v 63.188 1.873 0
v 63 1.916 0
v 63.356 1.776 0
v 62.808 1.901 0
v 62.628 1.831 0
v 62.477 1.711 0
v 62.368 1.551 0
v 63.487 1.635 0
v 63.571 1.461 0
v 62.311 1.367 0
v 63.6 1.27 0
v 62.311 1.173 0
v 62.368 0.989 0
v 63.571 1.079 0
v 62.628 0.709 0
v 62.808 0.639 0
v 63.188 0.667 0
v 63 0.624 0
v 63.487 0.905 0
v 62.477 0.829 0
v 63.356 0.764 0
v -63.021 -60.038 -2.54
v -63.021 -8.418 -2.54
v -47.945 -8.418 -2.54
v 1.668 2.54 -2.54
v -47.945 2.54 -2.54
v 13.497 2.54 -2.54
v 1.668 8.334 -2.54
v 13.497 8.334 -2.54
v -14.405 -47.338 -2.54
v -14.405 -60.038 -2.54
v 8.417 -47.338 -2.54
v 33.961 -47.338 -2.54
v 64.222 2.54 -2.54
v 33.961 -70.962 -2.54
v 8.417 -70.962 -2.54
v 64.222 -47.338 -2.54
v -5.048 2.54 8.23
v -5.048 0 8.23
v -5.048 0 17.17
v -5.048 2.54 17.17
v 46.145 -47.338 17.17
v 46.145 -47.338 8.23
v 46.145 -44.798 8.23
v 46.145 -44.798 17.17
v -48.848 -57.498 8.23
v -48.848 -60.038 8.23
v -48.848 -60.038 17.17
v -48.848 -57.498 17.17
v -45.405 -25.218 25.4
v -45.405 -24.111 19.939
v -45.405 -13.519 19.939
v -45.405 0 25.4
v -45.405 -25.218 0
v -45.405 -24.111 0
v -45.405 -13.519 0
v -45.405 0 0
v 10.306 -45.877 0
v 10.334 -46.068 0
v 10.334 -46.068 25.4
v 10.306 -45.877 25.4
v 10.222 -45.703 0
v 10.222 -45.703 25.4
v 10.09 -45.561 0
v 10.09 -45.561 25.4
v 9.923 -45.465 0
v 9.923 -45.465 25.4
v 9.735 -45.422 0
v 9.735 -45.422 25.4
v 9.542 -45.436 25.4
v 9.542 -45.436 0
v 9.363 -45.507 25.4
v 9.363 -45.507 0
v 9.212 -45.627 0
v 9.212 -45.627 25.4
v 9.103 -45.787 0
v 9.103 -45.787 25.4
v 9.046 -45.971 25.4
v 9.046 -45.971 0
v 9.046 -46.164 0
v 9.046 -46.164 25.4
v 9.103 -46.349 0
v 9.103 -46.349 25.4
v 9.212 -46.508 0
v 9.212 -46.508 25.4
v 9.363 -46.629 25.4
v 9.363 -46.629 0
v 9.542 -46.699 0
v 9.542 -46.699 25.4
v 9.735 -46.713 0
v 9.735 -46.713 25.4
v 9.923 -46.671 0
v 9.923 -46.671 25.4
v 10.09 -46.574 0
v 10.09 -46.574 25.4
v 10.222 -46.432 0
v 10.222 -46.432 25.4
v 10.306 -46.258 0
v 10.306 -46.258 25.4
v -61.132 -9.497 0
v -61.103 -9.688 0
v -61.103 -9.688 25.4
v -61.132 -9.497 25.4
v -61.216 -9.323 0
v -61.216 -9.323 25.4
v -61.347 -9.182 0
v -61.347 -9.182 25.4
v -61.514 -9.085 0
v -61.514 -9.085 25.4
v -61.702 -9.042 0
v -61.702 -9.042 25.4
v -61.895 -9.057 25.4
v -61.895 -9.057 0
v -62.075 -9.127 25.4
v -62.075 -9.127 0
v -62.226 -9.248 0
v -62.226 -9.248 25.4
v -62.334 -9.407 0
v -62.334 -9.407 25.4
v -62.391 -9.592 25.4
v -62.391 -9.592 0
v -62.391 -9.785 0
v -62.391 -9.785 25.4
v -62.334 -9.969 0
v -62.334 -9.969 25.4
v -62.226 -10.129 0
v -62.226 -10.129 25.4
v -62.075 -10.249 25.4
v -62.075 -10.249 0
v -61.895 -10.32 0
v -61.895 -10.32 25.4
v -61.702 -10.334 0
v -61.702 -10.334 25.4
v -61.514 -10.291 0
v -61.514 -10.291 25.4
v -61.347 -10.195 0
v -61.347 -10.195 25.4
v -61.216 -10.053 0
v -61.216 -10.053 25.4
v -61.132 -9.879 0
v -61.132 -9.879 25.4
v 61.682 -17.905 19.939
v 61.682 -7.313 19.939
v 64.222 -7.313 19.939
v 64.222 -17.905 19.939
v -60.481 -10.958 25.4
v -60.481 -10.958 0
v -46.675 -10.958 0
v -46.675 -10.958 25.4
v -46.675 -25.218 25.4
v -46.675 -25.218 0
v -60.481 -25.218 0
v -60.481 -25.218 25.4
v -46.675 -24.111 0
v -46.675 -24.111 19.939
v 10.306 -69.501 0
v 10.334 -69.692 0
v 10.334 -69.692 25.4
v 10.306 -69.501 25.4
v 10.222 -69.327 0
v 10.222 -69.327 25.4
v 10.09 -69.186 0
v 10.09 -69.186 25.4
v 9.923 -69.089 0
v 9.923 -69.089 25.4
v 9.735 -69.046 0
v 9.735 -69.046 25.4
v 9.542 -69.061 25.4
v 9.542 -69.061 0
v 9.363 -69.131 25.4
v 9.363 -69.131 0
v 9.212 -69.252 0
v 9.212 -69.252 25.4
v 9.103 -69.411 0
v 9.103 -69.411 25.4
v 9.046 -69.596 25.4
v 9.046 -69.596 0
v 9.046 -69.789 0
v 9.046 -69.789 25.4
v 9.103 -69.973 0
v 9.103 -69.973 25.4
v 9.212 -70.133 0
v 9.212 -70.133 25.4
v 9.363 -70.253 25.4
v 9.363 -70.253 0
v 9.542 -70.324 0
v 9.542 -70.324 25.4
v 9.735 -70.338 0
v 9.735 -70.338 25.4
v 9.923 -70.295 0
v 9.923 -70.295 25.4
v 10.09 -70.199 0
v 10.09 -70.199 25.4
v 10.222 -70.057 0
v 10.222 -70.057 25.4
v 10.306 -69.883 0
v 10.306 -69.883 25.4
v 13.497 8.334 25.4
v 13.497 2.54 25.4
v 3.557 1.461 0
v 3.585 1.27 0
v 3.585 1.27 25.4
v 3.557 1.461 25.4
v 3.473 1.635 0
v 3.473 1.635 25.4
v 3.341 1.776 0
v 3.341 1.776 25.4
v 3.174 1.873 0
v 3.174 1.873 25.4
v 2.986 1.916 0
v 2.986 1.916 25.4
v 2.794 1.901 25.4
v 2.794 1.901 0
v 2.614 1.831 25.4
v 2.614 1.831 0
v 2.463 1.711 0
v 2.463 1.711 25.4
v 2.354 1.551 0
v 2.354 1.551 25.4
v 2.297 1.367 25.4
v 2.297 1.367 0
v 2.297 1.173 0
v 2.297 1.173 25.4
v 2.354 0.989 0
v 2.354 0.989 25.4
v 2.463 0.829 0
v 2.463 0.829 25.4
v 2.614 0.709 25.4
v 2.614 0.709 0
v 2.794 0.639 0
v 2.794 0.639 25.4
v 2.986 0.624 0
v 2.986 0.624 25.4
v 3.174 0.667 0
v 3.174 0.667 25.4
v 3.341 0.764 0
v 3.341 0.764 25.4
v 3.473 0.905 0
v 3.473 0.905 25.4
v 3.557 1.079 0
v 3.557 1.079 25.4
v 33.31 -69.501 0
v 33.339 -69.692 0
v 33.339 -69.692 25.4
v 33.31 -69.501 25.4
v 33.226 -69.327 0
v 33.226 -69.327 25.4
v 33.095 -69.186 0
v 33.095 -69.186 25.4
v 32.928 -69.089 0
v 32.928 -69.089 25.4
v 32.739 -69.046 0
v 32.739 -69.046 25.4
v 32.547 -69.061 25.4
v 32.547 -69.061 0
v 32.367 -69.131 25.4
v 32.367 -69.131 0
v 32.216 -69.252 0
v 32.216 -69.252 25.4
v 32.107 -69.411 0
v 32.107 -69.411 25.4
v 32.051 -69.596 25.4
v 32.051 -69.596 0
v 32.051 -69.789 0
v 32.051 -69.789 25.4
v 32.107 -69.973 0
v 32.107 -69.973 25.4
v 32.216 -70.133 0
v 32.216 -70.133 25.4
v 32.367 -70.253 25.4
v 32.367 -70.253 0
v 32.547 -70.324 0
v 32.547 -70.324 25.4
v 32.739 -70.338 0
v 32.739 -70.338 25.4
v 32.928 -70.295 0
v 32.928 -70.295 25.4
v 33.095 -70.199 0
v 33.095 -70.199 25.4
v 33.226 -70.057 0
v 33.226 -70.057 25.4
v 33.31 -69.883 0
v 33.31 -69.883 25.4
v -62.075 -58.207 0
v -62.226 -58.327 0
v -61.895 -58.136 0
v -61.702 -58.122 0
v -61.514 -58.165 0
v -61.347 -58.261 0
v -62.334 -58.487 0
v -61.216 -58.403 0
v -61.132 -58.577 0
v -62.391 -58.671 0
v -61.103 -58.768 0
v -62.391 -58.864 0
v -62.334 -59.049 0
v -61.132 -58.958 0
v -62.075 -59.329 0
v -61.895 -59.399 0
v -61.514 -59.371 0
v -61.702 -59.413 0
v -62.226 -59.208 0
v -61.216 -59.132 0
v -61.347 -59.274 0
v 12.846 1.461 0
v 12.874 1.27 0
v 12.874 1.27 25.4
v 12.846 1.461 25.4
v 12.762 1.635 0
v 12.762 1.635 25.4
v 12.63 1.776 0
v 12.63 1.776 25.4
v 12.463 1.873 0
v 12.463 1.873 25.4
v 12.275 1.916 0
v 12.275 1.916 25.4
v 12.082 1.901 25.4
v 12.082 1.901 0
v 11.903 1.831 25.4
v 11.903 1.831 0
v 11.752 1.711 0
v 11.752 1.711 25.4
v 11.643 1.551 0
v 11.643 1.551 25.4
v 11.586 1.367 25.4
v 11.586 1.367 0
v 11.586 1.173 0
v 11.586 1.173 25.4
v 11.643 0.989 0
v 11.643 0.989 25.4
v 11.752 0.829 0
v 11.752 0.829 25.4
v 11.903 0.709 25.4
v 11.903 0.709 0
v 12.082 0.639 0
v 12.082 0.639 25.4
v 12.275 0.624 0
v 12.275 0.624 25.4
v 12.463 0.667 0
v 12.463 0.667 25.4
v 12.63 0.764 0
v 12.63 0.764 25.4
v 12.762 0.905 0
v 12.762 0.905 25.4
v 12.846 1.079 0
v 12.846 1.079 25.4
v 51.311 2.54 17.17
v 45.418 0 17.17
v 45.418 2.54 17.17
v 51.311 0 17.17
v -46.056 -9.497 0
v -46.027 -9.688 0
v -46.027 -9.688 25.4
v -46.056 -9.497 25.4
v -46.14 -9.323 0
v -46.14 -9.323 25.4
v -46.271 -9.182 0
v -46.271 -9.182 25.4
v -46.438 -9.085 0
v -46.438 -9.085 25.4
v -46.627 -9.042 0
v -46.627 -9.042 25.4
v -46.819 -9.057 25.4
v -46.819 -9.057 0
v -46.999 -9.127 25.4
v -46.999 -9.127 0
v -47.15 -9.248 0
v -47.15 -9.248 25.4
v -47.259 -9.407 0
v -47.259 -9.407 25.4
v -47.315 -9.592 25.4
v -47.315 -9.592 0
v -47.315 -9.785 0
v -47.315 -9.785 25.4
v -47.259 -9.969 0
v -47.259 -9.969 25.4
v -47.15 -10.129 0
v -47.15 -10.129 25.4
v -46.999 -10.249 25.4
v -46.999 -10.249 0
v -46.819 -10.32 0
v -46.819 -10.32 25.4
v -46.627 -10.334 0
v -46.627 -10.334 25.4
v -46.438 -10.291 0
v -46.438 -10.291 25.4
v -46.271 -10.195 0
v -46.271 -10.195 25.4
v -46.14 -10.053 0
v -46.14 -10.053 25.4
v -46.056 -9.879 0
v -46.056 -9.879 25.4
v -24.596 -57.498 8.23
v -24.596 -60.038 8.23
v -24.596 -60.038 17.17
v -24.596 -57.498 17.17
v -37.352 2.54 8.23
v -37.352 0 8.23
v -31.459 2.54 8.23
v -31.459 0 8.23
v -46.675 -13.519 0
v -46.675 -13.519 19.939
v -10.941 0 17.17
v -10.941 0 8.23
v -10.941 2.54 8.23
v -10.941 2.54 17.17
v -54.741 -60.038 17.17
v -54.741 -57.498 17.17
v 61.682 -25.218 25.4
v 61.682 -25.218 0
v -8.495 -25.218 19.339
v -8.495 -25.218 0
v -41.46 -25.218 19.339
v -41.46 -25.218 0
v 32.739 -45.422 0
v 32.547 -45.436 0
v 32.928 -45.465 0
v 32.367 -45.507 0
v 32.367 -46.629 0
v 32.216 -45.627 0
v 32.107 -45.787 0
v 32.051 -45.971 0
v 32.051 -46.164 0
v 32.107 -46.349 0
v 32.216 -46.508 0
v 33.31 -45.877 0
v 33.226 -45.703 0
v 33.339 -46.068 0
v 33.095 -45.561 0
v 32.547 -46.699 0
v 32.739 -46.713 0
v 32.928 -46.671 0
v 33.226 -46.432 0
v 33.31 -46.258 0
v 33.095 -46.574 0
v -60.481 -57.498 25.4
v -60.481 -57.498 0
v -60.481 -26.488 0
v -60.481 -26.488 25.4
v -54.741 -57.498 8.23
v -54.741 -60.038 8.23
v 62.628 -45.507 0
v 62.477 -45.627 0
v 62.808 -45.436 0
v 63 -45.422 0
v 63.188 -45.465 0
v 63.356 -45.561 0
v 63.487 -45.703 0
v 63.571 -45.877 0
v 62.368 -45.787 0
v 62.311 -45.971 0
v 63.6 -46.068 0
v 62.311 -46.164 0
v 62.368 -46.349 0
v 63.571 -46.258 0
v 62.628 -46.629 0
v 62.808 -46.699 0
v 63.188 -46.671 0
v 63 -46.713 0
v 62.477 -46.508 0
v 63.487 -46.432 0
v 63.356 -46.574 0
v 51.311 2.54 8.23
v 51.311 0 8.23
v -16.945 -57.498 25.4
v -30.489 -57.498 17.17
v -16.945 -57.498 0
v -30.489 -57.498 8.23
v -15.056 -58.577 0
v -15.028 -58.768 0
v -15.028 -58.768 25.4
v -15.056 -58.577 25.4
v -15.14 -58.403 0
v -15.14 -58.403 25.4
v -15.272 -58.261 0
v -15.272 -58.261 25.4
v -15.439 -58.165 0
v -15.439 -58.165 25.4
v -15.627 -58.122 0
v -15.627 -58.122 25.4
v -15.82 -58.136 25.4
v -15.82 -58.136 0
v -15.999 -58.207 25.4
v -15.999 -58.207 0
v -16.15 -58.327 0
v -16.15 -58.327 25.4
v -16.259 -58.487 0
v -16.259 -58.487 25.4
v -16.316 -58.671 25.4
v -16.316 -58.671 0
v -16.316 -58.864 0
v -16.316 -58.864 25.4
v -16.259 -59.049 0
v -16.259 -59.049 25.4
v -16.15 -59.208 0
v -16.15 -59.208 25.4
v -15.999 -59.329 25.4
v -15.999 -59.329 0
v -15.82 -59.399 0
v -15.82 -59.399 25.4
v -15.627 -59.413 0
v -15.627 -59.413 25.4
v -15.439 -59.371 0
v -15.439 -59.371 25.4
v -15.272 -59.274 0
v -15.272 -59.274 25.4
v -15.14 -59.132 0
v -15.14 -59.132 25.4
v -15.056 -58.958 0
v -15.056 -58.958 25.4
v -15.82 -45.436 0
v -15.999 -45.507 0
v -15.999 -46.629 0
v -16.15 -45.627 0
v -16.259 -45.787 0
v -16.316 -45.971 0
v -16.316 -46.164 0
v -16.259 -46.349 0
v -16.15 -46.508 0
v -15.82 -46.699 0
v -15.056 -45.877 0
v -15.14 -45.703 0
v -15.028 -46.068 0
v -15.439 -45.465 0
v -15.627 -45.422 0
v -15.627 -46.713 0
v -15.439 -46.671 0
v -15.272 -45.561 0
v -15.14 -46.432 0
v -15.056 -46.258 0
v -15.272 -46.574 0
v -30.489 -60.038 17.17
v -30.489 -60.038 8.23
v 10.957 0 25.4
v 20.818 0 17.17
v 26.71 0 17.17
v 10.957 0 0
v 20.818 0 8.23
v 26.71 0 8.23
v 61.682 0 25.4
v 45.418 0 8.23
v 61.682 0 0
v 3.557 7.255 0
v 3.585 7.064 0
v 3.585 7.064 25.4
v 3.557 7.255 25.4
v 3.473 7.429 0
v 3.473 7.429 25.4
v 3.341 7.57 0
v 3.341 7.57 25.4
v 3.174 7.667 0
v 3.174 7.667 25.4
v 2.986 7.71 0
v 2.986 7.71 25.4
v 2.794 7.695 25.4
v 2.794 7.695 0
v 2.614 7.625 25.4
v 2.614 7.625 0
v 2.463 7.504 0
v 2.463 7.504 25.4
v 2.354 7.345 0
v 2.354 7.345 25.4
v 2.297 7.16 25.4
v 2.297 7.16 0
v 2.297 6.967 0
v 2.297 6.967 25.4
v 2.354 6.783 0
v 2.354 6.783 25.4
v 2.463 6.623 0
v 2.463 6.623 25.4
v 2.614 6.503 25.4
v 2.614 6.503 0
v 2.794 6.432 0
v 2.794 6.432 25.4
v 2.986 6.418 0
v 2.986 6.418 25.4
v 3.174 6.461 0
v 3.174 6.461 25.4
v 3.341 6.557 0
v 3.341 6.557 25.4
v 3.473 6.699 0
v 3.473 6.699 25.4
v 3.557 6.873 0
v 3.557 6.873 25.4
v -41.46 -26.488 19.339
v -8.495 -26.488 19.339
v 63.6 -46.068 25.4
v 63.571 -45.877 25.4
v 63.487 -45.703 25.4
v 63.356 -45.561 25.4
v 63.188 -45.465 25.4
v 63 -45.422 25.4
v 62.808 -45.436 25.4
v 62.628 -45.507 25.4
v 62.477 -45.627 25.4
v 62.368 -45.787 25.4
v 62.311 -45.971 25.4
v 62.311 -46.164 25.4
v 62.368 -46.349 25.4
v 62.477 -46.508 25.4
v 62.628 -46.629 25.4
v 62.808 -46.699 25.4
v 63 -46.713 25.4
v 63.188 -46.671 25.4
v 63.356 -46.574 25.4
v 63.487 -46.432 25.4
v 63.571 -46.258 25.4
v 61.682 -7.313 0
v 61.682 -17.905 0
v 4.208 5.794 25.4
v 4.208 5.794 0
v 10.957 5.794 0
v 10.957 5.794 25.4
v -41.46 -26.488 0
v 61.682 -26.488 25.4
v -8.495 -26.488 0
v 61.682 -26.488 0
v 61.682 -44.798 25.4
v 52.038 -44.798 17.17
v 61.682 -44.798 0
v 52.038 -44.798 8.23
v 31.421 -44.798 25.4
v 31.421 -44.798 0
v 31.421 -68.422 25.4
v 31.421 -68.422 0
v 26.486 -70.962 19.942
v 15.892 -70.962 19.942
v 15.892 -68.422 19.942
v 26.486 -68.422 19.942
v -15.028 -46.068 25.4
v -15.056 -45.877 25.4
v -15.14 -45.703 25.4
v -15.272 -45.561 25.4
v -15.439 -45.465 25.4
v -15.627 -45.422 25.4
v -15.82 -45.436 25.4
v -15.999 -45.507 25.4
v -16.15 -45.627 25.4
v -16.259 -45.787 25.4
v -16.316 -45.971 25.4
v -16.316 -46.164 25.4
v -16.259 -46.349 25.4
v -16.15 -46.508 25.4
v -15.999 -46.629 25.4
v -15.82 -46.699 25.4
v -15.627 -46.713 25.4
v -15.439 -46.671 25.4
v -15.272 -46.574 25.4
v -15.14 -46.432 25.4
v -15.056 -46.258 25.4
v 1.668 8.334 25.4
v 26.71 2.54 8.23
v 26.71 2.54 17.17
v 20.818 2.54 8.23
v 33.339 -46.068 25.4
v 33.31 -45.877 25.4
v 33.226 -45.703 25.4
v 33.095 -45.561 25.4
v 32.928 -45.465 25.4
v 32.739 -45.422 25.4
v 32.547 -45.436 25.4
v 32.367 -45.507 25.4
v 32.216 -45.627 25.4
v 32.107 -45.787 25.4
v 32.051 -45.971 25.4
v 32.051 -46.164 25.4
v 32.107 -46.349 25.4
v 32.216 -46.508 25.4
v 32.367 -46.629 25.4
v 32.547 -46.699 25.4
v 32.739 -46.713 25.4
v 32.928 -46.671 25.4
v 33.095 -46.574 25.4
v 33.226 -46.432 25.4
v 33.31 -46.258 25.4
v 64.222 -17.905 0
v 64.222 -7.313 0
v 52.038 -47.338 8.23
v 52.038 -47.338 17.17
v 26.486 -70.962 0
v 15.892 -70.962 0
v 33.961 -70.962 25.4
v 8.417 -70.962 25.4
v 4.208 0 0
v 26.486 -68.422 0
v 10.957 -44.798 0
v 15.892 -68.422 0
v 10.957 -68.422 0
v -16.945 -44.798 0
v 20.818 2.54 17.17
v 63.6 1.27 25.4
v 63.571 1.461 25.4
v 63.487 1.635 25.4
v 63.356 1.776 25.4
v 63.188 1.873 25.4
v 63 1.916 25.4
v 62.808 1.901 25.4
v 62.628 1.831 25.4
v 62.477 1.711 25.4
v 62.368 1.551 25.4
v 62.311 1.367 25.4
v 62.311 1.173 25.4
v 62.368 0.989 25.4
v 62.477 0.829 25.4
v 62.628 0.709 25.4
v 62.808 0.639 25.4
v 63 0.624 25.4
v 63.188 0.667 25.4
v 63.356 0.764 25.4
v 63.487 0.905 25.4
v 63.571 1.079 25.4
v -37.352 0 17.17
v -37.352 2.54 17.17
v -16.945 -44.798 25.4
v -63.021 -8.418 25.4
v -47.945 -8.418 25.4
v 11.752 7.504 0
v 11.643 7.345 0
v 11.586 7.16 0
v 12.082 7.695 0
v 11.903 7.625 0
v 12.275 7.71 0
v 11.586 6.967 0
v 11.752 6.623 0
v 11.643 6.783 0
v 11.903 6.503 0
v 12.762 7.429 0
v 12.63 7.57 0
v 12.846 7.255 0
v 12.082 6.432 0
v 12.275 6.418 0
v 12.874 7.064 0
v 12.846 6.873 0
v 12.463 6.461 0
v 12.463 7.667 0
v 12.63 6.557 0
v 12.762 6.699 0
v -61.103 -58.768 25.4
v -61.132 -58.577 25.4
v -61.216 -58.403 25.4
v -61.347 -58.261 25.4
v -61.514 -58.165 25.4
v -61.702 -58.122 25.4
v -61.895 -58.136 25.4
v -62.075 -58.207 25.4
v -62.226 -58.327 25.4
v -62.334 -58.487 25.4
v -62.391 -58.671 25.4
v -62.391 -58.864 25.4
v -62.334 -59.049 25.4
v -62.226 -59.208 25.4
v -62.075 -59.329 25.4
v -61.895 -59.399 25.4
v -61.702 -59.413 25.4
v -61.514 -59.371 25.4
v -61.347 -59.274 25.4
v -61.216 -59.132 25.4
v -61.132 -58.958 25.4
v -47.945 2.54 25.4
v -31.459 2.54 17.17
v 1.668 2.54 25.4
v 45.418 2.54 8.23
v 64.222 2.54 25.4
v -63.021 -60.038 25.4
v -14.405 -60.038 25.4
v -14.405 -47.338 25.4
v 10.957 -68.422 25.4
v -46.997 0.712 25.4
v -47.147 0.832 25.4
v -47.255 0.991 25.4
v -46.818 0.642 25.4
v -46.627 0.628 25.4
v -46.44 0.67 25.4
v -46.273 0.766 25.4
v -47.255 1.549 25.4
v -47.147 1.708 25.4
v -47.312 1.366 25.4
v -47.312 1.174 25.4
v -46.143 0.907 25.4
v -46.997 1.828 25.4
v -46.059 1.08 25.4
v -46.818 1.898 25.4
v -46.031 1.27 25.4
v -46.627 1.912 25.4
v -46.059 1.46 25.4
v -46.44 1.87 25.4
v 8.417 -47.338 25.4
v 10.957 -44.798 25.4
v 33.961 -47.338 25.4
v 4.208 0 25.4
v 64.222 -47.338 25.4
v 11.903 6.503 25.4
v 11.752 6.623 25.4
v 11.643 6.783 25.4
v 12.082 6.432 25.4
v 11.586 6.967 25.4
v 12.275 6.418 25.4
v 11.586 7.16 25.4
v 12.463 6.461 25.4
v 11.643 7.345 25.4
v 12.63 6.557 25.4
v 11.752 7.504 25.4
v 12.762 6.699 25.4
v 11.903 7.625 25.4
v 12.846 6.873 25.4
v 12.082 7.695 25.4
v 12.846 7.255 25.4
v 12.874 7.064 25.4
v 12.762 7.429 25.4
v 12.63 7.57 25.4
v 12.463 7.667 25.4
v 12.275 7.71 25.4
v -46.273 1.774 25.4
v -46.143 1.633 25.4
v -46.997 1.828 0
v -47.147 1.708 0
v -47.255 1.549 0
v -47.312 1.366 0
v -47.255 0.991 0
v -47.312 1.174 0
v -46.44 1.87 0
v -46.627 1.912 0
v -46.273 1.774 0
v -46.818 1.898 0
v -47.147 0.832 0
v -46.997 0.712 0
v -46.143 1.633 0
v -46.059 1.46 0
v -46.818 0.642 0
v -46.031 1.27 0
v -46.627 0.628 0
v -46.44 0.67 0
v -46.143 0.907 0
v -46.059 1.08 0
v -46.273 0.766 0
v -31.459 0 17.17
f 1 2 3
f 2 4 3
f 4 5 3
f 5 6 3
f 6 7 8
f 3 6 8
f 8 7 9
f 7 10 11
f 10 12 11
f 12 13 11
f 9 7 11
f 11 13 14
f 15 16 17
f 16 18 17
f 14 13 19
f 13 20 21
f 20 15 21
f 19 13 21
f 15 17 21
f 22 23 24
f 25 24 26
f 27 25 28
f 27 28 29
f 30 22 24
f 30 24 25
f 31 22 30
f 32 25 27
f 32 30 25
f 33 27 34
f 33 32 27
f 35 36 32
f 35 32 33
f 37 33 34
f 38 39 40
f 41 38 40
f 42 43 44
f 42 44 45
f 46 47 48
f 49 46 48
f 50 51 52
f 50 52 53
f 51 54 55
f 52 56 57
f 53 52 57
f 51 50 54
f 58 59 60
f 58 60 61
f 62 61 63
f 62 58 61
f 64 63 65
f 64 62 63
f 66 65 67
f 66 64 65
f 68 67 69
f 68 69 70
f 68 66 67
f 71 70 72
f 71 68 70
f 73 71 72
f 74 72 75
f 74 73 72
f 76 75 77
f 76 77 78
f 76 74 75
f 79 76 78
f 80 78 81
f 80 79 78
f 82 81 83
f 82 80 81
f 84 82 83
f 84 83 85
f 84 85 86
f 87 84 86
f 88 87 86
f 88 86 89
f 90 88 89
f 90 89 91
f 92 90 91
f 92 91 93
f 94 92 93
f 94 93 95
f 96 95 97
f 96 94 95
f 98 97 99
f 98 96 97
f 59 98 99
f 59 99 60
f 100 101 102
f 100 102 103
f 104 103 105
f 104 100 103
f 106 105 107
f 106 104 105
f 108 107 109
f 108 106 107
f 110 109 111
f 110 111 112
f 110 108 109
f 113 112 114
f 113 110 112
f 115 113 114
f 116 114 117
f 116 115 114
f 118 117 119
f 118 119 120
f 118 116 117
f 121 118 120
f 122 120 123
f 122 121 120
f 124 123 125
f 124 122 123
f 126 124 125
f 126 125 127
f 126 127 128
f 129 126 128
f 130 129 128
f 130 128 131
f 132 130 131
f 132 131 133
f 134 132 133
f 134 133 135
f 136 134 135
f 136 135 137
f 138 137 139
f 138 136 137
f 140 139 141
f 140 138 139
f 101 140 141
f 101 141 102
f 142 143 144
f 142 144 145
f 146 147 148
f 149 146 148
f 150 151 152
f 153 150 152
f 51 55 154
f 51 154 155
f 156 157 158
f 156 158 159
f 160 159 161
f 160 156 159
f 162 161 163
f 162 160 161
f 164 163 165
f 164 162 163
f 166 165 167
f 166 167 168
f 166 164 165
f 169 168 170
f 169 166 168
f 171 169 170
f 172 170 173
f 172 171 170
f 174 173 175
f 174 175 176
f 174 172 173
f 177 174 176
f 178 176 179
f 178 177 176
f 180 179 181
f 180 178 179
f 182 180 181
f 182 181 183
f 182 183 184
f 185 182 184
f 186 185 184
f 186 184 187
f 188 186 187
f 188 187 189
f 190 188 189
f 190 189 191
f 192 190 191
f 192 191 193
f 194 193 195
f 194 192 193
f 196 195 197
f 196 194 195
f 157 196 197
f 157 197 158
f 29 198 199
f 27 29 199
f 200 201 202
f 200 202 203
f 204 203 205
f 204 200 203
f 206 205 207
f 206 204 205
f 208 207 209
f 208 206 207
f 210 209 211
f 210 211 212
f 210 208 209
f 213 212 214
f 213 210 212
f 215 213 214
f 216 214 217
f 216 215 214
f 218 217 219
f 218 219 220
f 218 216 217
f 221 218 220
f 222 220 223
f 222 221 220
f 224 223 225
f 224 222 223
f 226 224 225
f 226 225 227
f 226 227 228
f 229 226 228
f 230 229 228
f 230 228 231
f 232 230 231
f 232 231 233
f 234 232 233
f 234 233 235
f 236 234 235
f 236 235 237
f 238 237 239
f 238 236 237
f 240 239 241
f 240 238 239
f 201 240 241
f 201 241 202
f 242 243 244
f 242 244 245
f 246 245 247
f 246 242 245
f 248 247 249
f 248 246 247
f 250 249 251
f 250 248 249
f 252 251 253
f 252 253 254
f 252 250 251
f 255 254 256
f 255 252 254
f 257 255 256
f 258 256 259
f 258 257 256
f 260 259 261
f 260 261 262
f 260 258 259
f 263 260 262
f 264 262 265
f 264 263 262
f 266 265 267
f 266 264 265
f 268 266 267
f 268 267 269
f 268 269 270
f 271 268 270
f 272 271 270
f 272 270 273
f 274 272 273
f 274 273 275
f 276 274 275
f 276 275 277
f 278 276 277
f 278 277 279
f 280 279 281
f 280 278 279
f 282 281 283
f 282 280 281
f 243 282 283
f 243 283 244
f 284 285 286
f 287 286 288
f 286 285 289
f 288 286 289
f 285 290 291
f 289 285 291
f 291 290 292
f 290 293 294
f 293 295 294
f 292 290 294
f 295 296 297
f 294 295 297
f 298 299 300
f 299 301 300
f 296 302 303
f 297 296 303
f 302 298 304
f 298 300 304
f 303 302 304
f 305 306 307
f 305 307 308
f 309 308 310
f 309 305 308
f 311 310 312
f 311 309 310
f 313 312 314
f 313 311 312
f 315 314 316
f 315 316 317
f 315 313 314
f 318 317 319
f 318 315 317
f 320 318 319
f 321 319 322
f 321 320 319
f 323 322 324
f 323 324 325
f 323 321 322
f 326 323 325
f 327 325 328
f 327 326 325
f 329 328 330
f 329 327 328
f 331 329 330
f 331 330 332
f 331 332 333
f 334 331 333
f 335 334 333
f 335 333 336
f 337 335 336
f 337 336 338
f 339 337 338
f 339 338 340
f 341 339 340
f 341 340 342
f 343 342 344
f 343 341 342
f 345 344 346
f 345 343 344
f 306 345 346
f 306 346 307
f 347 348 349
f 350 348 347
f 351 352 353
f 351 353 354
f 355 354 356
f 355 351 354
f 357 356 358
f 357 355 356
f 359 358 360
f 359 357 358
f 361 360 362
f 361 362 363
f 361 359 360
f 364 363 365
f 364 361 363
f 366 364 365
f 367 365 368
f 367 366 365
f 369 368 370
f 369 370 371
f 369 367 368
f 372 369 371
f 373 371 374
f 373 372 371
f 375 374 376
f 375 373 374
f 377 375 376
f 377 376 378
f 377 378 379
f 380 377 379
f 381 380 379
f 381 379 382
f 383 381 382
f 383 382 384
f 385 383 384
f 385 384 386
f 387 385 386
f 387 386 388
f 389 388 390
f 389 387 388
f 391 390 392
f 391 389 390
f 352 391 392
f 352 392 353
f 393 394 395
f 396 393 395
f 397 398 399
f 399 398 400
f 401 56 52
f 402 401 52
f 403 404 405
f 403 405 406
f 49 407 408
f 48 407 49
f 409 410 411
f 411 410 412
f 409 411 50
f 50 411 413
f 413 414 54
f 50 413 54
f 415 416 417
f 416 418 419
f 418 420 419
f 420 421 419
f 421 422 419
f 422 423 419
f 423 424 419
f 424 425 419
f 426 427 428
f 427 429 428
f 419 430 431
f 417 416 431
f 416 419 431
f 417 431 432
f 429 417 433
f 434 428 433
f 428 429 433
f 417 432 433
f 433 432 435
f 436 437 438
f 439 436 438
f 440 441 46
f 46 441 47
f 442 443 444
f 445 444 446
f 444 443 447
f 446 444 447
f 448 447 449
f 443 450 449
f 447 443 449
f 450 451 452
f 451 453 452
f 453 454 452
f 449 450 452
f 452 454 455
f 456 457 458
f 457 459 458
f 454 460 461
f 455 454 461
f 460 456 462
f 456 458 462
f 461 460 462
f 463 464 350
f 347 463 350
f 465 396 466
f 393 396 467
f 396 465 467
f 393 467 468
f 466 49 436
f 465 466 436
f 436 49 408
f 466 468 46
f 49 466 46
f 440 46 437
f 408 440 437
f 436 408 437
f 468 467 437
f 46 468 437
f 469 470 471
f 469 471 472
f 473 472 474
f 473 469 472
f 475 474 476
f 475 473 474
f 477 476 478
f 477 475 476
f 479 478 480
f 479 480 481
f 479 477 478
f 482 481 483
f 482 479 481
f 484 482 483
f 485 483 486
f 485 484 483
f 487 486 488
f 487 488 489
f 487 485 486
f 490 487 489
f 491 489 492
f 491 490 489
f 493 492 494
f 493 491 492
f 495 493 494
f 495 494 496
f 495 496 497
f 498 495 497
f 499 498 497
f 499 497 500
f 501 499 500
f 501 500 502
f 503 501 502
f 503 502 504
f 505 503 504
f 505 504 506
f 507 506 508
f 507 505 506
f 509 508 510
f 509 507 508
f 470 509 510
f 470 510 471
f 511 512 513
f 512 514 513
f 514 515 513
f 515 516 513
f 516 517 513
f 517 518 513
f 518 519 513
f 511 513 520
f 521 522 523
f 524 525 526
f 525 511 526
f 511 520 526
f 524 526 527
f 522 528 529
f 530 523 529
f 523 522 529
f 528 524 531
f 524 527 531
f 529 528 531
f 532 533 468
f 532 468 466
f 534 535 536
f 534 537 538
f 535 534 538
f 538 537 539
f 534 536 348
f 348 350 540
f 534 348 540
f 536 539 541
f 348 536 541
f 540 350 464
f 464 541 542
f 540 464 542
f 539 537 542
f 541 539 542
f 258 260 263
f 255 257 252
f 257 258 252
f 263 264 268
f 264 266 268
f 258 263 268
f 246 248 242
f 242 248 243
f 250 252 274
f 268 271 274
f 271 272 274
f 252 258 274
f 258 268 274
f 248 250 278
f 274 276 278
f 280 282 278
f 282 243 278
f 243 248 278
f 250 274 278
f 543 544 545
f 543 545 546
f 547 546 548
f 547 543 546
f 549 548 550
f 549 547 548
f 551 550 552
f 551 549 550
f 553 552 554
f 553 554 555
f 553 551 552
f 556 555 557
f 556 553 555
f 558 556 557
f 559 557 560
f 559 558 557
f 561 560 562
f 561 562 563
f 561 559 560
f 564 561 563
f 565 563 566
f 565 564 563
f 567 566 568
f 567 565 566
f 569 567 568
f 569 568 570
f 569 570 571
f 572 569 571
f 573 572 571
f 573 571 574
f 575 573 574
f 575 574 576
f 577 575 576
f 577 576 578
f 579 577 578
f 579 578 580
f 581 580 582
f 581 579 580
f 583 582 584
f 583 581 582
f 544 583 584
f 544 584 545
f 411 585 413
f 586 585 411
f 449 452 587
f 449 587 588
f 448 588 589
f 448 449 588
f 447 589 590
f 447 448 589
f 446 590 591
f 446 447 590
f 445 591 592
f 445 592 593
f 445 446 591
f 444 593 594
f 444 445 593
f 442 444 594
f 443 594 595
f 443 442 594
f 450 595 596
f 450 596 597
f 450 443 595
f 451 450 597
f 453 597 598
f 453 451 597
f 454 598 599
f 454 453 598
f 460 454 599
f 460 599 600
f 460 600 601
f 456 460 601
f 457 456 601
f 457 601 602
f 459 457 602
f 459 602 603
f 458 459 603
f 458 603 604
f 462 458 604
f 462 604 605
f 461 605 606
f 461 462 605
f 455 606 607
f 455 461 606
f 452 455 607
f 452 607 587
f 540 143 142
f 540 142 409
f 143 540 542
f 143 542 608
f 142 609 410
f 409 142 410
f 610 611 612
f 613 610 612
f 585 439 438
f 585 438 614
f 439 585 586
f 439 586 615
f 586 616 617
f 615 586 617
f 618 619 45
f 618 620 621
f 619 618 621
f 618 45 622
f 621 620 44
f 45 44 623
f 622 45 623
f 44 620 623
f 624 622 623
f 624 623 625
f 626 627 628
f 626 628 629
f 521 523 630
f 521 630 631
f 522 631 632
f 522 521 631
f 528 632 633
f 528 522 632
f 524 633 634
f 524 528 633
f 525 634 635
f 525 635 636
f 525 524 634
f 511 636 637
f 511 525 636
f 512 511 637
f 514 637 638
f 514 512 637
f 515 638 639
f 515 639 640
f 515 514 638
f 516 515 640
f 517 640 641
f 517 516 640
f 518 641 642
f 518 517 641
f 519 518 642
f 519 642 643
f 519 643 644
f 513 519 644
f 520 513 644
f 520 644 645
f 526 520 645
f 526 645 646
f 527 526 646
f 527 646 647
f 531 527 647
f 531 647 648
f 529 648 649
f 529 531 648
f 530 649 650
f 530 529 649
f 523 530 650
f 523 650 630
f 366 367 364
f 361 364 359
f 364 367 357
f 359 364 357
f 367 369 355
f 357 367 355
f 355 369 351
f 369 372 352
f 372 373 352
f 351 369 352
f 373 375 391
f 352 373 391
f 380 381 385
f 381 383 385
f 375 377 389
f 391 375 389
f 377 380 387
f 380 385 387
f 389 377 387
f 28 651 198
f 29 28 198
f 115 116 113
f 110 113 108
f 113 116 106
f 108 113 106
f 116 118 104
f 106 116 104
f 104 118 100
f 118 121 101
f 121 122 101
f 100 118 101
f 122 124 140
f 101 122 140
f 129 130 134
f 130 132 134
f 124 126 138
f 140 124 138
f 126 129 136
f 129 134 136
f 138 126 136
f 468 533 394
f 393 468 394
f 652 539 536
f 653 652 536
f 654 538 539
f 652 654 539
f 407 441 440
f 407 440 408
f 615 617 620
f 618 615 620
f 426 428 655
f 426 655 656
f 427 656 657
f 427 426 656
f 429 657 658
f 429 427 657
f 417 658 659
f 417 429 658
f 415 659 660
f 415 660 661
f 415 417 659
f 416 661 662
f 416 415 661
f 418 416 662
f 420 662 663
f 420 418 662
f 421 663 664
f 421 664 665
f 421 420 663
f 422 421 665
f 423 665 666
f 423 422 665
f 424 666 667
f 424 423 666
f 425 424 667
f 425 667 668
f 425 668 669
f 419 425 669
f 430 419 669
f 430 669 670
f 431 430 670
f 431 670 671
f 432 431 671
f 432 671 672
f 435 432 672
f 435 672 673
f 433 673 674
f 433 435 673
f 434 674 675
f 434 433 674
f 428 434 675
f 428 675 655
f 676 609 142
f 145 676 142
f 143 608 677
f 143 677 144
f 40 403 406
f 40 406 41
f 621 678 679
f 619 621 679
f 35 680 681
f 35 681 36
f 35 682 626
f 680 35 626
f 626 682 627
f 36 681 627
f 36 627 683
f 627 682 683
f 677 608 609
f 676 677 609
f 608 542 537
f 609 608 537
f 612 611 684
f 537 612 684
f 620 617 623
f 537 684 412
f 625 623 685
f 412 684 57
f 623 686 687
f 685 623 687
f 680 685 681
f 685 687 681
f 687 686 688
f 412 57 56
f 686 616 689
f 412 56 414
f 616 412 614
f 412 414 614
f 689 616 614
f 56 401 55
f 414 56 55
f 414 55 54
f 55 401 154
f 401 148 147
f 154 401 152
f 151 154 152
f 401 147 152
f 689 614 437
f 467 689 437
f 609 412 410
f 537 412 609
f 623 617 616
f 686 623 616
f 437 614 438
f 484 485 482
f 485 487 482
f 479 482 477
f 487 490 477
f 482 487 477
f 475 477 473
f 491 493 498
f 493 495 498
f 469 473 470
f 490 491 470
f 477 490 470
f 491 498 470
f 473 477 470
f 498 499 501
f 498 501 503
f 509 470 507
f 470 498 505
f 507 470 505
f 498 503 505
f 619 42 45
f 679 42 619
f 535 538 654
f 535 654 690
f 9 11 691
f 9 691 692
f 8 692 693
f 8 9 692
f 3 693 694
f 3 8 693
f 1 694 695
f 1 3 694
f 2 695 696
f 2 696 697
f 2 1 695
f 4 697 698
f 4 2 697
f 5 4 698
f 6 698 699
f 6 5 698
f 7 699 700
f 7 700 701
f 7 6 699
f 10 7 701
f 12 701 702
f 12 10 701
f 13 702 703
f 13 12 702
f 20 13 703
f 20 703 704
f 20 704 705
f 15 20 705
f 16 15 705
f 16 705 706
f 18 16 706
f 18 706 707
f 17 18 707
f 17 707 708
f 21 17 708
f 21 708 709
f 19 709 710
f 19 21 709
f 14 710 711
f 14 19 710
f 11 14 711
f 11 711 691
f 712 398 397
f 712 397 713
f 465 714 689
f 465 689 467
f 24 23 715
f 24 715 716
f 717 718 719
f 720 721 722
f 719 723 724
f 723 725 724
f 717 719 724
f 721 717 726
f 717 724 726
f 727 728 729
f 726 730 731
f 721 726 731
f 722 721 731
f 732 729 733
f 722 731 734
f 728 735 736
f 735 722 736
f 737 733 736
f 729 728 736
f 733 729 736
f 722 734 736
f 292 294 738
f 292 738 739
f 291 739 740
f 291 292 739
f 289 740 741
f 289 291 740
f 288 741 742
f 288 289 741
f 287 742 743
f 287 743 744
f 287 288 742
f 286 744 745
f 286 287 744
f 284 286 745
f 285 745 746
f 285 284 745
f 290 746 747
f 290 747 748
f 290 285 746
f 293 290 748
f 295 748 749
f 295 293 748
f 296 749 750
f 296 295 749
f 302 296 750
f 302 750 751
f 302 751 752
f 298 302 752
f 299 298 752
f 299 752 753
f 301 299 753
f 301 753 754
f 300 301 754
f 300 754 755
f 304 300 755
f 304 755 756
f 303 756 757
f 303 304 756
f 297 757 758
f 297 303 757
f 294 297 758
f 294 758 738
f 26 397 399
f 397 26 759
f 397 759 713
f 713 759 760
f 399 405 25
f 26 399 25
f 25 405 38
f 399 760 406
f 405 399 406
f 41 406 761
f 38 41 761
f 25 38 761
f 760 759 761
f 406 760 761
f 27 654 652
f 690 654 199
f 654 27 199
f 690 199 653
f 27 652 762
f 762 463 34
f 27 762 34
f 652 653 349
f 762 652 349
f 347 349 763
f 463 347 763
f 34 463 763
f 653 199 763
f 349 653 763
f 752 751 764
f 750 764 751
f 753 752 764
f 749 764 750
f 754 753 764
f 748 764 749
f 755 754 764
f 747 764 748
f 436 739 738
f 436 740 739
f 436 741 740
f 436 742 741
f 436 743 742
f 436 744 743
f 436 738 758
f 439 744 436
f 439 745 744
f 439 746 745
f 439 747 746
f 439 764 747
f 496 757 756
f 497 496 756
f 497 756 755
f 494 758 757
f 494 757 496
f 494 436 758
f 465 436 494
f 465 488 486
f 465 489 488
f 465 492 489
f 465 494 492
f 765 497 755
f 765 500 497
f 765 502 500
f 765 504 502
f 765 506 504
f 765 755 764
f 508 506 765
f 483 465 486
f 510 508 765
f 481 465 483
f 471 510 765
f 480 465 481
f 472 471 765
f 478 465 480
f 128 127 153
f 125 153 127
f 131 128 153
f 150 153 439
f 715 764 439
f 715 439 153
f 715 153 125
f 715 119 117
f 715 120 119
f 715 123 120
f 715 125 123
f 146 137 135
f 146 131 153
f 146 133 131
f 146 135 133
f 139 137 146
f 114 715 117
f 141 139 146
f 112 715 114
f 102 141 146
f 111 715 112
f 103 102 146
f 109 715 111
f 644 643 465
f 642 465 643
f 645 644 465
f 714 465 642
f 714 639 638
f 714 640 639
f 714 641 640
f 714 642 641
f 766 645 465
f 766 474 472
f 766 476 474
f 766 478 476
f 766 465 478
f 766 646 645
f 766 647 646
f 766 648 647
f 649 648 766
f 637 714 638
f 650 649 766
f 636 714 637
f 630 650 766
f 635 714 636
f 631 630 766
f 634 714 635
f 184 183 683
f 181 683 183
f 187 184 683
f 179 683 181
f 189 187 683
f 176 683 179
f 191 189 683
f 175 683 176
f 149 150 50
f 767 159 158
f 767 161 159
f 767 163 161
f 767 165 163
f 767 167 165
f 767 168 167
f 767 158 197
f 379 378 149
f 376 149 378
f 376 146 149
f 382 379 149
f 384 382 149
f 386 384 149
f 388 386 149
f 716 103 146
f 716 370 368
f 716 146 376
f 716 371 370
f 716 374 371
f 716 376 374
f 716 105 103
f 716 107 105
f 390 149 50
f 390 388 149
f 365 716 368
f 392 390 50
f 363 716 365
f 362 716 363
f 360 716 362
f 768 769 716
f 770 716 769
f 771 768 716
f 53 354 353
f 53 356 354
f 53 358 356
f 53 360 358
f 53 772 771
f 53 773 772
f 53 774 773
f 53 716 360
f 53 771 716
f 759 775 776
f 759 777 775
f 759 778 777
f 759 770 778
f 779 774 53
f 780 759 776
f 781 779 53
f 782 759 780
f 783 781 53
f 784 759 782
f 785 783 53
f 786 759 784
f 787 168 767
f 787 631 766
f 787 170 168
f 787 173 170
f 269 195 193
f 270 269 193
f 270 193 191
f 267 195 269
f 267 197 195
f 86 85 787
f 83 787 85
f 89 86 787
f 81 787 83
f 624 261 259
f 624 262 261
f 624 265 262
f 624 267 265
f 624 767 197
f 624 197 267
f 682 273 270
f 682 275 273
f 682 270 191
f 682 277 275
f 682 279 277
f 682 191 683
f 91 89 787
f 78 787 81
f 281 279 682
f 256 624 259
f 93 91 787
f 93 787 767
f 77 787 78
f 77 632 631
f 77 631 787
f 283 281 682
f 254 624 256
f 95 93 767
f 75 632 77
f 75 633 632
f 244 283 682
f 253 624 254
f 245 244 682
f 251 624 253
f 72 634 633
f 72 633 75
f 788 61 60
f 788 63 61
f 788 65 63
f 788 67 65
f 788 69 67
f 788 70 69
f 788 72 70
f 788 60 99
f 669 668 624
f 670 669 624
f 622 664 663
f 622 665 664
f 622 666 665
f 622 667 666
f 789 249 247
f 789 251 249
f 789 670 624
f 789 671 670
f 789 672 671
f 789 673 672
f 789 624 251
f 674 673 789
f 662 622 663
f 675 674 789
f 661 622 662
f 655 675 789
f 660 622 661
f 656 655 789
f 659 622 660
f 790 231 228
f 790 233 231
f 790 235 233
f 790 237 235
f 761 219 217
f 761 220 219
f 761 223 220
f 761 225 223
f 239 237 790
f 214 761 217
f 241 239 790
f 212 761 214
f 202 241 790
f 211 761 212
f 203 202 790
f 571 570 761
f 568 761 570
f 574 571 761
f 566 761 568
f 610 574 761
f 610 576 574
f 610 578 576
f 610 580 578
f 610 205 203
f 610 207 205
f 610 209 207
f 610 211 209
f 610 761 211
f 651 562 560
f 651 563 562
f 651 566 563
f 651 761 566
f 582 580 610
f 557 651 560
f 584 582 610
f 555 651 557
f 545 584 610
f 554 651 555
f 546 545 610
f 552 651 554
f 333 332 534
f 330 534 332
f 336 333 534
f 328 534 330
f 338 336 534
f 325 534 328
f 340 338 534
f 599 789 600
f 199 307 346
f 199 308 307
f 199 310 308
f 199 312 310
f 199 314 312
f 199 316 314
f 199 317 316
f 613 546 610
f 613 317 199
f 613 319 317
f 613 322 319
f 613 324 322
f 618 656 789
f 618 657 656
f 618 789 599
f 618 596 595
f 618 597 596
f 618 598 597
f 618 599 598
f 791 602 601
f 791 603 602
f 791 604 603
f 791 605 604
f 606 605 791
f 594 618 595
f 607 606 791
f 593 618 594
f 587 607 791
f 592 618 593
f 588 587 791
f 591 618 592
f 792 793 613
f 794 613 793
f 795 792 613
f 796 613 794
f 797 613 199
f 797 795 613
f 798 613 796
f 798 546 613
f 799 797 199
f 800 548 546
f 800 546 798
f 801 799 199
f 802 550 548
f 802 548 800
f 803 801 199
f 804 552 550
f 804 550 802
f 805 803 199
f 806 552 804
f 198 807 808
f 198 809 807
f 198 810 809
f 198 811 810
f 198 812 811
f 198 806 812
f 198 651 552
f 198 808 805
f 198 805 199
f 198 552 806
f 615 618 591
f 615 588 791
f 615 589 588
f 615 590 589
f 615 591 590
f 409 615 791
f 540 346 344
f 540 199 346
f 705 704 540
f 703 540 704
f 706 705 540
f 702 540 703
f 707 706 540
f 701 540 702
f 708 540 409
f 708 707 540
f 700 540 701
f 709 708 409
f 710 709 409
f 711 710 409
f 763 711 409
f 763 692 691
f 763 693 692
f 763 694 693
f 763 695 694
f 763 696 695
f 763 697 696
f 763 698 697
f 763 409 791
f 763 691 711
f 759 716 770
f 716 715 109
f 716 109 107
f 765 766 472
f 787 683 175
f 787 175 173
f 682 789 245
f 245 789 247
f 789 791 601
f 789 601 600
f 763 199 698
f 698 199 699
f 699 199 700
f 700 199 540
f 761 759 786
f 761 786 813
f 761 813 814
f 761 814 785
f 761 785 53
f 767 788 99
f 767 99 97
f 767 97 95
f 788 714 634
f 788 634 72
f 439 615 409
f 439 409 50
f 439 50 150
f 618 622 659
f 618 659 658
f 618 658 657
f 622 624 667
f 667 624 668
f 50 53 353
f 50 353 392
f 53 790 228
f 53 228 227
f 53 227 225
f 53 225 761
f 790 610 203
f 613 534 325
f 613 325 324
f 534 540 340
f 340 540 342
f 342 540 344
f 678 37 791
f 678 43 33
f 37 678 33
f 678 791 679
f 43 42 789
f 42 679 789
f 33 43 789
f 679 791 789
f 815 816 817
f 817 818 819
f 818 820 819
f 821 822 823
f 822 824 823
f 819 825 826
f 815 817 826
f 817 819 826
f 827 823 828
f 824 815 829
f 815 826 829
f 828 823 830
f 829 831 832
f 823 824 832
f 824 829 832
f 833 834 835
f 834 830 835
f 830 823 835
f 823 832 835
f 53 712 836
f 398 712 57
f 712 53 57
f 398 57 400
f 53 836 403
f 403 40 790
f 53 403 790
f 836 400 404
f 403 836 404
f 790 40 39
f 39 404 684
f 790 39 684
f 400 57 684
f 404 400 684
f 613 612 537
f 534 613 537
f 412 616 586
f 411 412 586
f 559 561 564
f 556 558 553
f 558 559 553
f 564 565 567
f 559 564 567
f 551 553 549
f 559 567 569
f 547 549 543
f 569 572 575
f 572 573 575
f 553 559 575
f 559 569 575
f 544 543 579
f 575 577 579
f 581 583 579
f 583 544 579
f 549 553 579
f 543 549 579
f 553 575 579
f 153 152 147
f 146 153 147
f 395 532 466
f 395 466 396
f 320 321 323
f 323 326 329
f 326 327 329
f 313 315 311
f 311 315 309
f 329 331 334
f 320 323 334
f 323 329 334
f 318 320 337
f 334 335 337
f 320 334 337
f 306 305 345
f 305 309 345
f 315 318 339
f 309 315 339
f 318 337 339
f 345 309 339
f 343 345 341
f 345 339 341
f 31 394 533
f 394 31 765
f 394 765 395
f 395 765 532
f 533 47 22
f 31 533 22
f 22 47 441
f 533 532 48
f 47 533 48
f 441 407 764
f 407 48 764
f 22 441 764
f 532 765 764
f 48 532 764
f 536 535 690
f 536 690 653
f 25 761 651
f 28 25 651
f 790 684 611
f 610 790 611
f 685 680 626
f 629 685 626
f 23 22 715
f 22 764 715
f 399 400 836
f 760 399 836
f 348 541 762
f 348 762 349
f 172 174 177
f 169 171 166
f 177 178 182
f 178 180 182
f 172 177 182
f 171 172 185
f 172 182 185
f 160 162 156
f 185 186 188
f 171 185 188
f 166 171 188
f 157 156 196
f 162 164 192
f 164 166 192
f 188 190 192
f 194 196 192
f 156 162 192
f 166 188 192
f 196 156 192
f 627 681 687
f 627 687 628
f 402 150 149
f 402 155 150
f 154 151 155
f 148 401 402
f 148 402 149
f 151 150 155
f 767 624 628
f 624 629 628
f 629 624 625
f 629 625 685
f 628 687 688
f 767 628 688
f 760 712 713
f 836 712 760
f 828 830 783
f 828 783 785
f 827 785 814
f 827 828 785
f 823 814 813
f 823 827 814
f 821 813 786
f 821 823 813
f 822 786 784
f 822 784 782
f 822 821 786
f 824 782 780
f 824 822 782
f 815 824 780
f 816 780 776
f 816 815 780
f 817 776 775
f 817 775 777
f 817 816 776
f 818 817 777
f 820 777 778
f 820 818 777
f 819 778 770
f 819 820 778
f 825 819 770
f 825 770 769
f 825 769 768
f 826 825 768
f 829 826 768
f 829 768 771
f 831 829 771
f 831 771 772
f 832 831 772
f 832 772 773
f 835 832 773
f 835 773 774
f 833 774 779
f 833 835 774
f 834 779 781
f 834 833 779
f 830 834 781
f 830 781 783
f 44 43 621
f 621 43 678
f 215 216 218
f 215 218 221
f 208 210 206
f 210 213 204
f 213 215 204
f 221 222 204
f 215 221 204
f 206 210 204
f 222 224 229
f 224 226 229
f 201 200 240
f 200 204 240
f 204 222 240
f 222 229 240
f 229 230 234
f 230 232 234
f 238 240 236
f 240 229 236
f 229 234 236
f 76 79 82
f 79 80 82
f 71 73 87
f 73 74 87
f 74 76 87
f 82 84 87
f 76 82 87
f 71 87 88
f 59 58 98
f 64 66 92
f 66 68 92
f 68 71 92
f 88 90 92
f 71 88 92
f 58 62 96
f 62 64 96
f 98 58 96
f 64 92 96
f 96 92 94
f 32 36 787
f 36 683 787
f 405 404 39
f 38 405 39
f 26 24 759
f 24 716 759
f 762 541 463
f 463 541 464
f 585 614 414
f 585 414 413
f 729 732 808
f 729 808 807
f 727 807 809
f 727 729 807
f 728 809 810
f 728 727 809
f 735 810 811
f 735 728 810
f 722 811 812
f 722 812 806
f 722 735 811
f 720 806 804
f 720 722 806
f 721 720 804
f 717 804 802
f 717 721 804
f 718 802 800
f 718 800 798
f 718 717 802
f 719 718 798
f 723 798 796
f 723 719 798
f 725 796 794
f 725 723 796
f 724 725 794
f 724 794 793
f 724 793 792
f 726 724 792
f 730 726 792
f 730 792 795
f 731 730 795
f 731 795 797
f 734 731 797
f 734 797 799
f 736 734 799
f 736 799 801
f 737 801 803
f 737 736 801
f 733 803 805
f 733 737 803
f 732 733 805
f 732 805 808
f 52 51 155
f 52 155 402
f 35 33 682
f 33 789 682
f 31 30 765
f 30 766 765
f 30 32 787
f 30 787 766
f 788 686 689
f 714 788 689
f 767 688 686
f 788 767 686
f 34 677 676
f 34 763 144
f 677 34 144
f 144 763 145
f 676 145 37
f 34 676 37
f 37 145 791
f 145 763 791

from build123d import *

# Parameters (mm, degrees)
F0_R      = 0.6477
F0_R_2    = 0.6441405576
F0_W      = 1.27
F0_H      = 14.2598937347
F2_DEPTH  = 25.4
F12_DEPTH = 2.54
F4_W      = 5.8928
F4_H      = 8.9408
F3_W      = 5.8928
F3_H      = 8.9408
F13_DEPTH = 25.4
F6_W      = 5.8928
F6_H      = 8.9408
F5_W      = 10.5937230855
F5_H      = 19.9419036508
F7_W      = 5.8928
F7_H      = 8.9408
F14_DEPTH = 12.7
F10_W     = 10.5918
F10_H     = 19.939
F15_DEPTH = 12.7
F9_W      = 10.5918
F9_H      = 19.939
F16_DEPTH = 25.4
F8_W      = 32.9645648599
F8_H      = 19.3392261863
F17_DEPTH = 12.7


# Not quite as in the source:
# - the program builds the solid bodies; features that only make, move or delete a surface that nothing else refers to are left out


with BuildPart() as f2:
    # F0 (on Top) → F2 (new body)
    with BuildSketch(Plane.XY):
        Polygon((-45.4049956864, 2.54), (-47.9449956864, 2.54), (-47.9449956864, 0), (-47.9449956864, -8.4182334522), (-60.4807920754, -8.4182334522), (-63.0207920754, -8.4182334522), (-63.0207920754, -10.9582334522), (-63.0207920754, -57.4975824572), (-63.0207920754, -60.0375824572), (-60.4807920754, -60.0375824572), (-16.9454139954, -60.0375824572), (-14.4054139954, -60.0375824572), (-14.4054139954, -57.4975824572), (-14.4054139954, -47.3375824572), (8.416604454, -47.3375824572), (8.416604454, -68.4223124651), (8.416604454, -70.9623124651), (10.956604454, -70.9623124651), (31.4210504293, -70.9623124651), (33.9610504293, -70.9623124651), (33.9610504293, -68.4223124651), (33.9610504293, -47.3375824572), (61.6818144917, -47.3375824572), (64.2218144917, -47.3375824572), (64.2218144917, -44.7975824572), (64.2218144917, 0), (64.2218144917, 2.54), (61.6818144917, 2.54), (13.496604454, 2.54), (13.496604454, 5.7937128431), (13.496604454, 8.3337128431), (10.956604454, 8.3337128431), (4.2076310147, 8.3337128431), (1.6676310147, 8.3337128431), (1.6676310147, 5.7937128431), (1.6676310147, 2.54), align=None)
        with Locations((-61.7507920754, -58.7675824572)):
            Circle(F0_R, mode=Mode.SUBTRACT)
        with Locations((-15.6754139954, -58.7675824572)):
            Circle(F0_R, mode=Mode.SUBTRACT)
        with Locations((-15.6754139954, -46.0675824572)):
            Circle(F0_R, mode=Mode.SUBTRACT)
        with Locations((9.686604454, -69.6923124651)):
            Circle(F0_R, mode=Mode.SUBTRACT)
        with Locations((32.6910504293, -69.6923124651)):
            Circle(F0_R, mode=Mode.SUBTRACT)
        with Locations((9.686604454, -46.0675824572)):
            Circle(F0_R, mode=Mode.SUBTRACT)
        with Locations((32.6910504293, -46.0675824572)):
            Circle(F0_R, mode=Mode.SUBTRACT)
        with Locations((62.9518144917, -46.0675824572)):
            Circle(F0_R, mode=Mode.SUBTRACT)
        with Locations((-61.7507920754, -9.6882334522)):
            Circle(F0_R, mode=Mode.SUBTRACT)
        with Locations((-46.6749956864, -9.6882334522)):
            Circle(F0_R, mode=Mode.SUBTRACT)
        with Locations((-46.6749956864, 1.27)):
            Circle(F0_R_2, mode=Mode.SUBTRACT)
        Polygon((10.956604454, -68.4223124651), (10.956604454, -47.3375824572), (10.956604454, -44.7975824572), (8.416604454, -44.7975824572), (-14.4054139954, -44.7975824572), (-16.9454139954, -44.7975824572), (-16.9454139954, -47.3375824572), (-16.9454139954, -57.4975824572), (-60.4807920754, -57.4975824572), (-60.4807920754, -26.4881271869), (-60.4807920754, -25.2181271869), (-60.4807920754, -10.9582334522), (-47.9449956864, -10.9582334522), (-46.6749956864, -10.9582334522), (-45.4049956864, -10.9582334522), (-45.4049956864, -8.4182334522), (-45.4049956864, 0), (1.6676310147, 0), (4.2076310147, 0), (4.2076310147, 2.54), (4.2076310147, 5.7937128431), (10.956604454, 5.7937128431), (10.956604454, 2.54), (10.956604454, 0), (13.496604454, 0), (61.6818144917, 0), (61.6818144917, -25.2181271869), (61.6818144917, -26.4881271869), (61.6818144917, -44.7975824572), (33.9610504293, -44.7975824572), (31.4210504293, -44.7975824572), (31.4210504293, -47.3375824572), (31.4210504293, -68.4223124651), align=None, mode=Mode.SUBTRACT)
        with Locations((2.9376310147, 1.27)):
            Circle(F0_R, mode=Mode.SUBTRACT)
        with Locations((12.226604454, 1.27)):
            Circle(F0_R, mode=Mode.SUBTRACT)
        with Locations((2.9376310147, 7.0637128431)):
            Circle(F0_R, mode=Mode.SUBTRACT)
        with Locations((12.226604454, 7.0637128431)):
            Circle(F0_R, mode=Mode.SUBTRACT)
        with Locations((62.9518144917, 1.27)):
            Circle(F0_R, mode=Mode.SUBTRACT)
        Polygon((-60.4807920754, -26.4881271869), (61.6818144917, -26.4881271869), (61.6818144917, -25.2181271869), (-45.4049956864, -25.2181271869), (-46.6749956864, -25.2181271869), (-60.4807920754, -25.2181271869), align=None)
        with Locations((-46.0399956864, -18.0881803195)):
            Rectangle(F0_W, F0_H)
    extrude(amount=F2_DEPTH)

    # F11 (on face) → F12 (join)
    with BuildSketch(Plane(origin=(0, 0, 0), x_dir=(1, 0, 0), z_dir=(0, 0, -1))):
        Polygon((13.496604454, -8.3337128431), (13.496604454, -2.54), (64.2218144917, -2.54), (64.2218144917, 47.3375824572), (33.9610504293, 47.3375824572), (33.9610504293, 70.9623124651), (8.416604454, 70.9623124651), (8.416604454, 47.3375824572), (-14.4054139954, 47.3375824572), (-14.4054139954, 60.0375824572), (-63.0207920754, 60.0375824572), (-63.0207920754, 8.4182334522), (-47.9449956864, 8.4182334522), (-47.9449956864, -2.54), (1.6676310147, -2.54), (1.6676310147, -8.3337128431), align=None)
    extrude(amount=F12_DEPTH)

    # F4 (on face) + F3 (on face) → F13 (cut)
    with BuildSketch(Plane.XZ):
        with Locations((48.364430666, 12.7)):
            Rectangle(F4_W, F4_H)
        with Locations((23.7640291452, 12.7)):
            Rectangle(F4_W, F4_H)
    with BuildSketch(Plane.XZ):
        with Locations((-7.994512096, 12.7)):
            Rectangle(F3_W, F3_H)
        with Locations((-34.4051830471, 12.7)):
            Rectangle(F3_W, F3_H)
    extrude(amount=-F13_DEPTH, mode=Mode.SUBTRACT)

    # F6 (on face) + F5 (on face) + F7 (on face) → F14 (cut)
    with BuildSketch(Plane.XZ.offset(47.3375824572)):
        with Locations((49.0914324605, 12.7)):
            Rectangle(F6_W, F6_H)
    with BuildSketch(Plane.XZ.offset(70.9623124651)):
        with Locations((21.1888274417, 9.9709518254)):
            Rectangle(F5_W, F5_H)
    with BuildSketch(Plane.XZ.offset(60.0375824572)):
        with Locations((-27.5427140296, 12.7)):
            Rectangle(F7_W, F7_H)
        with Locations((-51.7941080034, 12.7)):
            Rectangle(F7_W, F7_H)
    extrude(amount=-F14_DEPTH, mode=Mode.SUBTRACT)

    # F10 (on face) → F15 (cut)
    with BuildSketch(Plane.YZ.offset(-45.4049956864)):
        with Locations((-18.8149667105, 9.9695)):
            Rectangle(F10_W, F10_H)
    extrude(amount=-F15_DEPTH, mode=Mode.SUBTRACT)

    # F9 (on face) → F16 (cut)
    with BuildSketch(Plane(origin=(61.6818144917, 0, 0), x_dir=(0, -1, 0), z_dir=(-1, 0, 0))):
        with Locations((12.6090635934, 9.9695)):
            Rectangle(F9_W, F9_H)
    extrude(amount=-F16_DEPTH, mode=Mode.SUBTRACT)

    # F8 (on face) → F17 (cut)
    with BuildSketch(Plane.XZ.offset(26.4881271869)):
        with Locations((-24.977594614, 9.6696130931)):
            Rectangle(F8_W, F8_H)
    extrude(amount=-F17_DEPTH, mode=Mode.SUBTRACT)


solid = f2.part
